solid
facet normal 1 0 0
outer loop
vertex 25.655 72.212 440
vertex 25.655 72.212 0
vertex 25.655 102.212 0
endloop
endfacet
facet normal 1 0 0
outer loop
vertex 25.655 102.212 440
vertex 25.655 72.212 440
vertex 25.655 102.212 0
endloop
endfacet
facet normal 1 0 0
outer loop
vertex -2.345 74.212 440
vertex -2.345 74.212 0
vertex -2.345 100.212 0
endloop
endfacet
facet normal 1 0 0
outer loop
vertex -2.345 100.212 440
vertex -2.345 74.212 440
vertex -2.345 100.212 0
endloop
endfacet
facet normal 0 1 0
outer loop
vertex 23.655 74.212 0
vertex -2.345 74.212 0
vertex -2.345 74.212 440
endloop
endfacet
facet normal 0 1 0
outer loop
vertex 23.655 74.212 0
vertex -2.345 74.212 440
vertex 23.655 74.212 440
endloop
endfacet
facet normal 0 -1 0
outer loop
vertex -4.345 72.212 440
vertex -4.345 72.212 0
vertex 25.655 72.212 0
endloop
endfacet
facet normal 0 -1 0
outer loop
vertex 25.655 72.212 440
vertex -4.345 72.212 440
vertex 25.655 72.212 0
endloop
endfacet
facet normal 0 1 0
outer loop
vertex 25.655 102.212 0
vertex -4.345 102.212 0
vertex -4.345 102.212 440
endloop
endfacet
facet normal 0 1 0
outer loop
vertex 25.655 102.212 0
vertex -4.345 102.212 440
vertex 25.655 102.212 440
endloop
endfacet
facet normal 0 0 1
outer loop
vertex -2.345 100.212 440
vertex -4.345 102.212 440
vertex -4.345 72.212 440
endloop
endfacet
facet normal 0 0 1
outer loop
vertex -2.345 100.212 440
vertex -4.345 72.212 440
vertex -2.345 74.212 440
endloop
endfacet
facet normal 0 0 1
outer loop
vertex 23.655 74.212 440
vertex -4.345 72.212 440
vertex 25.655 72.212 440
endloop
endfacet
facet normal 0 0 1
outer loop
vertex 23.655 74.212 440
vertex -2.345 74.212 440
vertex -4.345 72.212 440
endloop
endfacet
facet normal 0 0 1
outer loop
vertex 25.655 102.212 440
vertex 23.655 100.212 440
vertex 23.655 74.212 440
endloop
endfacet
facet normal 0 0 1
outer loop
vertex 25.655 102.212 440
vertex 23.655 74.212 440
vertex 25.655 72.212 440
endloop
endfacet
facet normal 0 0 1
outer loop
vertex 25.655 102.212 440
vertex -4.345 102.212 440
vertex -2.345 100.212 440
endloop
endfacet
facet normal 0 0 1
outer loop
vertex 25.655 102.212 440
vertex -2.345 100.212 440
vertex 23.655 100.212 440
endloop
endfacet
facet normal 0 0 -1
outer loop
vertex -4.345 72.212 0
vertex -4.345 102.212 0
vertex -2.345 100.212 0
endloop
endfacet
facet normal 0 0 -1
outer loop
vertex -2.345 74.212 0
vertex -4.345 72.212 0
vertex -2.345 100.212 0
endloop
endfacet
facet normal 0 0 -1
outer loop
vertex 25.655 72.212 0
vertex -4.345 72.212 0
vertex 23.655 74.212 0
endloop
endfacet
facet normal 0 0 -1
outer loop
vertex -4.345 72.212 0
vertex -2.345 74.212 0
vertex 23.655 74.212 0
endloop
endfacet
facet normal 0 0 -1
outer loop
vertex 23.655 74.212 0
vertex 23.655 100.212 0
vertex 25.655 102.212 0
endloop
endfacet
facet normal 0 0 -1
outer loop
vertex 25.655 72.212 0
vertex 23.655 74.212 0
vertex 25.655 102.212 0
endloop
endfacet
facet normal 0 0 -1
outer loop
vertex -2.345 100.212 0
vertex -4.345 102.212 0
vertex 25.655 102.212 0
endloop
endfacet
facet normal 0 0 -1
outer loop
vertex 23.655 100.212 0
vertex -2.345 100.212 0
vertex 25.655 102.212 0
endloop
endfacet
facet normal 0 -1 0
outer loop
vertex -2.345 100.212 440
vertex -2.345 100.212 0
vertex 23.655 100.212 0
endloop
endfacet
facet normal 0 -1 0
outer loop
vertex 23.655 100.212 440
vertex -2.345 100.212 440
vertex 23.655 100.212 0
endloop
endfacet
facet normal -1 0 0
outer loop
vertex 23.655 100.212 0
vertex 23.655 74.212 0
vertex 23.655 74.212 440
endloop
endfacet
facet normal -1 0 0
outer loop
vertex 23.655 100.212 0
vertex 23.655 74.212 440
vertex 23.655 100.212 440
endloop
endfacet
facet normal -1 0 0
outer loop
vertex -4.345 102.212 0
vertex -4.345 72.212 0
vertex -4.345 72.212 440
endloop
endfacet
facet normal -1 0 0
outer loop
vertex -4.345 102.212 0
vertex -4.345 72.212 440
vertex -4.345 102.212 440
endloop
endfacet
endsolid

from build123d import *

# Parameters (mm, degrees)
ESBO_O1_W                = 30
ESBO_O1_H                = 30
RESSALTO_EXTRUS_O1_DEPTH = 440
CASCA1_T                 = -2


with BuildPart() as part:
    # Esboço1 → Ressalto-extrusão1 (new body)
    with BuildSketch(Plane.XY):
        with Locations((10.655165912, 87.212171493)):
            Rectangle(ESBO_O1_W, ESBO_O1_H)
    extrude(amount=RESSALTO_EXTRUS_O1_DEPTH)

    # Casca1
    casca1_openings = [part.faces().sort_by_distance(p)[0] for p in [
        (10.655165912, 87.212171493, 440),
        (10.655165912, 87.212171493, 0),
    ]]
    offset(amount=CASCA1_T, openings=casca1_openings, kind=Kind.INTERSECTION)


solid = part.part
